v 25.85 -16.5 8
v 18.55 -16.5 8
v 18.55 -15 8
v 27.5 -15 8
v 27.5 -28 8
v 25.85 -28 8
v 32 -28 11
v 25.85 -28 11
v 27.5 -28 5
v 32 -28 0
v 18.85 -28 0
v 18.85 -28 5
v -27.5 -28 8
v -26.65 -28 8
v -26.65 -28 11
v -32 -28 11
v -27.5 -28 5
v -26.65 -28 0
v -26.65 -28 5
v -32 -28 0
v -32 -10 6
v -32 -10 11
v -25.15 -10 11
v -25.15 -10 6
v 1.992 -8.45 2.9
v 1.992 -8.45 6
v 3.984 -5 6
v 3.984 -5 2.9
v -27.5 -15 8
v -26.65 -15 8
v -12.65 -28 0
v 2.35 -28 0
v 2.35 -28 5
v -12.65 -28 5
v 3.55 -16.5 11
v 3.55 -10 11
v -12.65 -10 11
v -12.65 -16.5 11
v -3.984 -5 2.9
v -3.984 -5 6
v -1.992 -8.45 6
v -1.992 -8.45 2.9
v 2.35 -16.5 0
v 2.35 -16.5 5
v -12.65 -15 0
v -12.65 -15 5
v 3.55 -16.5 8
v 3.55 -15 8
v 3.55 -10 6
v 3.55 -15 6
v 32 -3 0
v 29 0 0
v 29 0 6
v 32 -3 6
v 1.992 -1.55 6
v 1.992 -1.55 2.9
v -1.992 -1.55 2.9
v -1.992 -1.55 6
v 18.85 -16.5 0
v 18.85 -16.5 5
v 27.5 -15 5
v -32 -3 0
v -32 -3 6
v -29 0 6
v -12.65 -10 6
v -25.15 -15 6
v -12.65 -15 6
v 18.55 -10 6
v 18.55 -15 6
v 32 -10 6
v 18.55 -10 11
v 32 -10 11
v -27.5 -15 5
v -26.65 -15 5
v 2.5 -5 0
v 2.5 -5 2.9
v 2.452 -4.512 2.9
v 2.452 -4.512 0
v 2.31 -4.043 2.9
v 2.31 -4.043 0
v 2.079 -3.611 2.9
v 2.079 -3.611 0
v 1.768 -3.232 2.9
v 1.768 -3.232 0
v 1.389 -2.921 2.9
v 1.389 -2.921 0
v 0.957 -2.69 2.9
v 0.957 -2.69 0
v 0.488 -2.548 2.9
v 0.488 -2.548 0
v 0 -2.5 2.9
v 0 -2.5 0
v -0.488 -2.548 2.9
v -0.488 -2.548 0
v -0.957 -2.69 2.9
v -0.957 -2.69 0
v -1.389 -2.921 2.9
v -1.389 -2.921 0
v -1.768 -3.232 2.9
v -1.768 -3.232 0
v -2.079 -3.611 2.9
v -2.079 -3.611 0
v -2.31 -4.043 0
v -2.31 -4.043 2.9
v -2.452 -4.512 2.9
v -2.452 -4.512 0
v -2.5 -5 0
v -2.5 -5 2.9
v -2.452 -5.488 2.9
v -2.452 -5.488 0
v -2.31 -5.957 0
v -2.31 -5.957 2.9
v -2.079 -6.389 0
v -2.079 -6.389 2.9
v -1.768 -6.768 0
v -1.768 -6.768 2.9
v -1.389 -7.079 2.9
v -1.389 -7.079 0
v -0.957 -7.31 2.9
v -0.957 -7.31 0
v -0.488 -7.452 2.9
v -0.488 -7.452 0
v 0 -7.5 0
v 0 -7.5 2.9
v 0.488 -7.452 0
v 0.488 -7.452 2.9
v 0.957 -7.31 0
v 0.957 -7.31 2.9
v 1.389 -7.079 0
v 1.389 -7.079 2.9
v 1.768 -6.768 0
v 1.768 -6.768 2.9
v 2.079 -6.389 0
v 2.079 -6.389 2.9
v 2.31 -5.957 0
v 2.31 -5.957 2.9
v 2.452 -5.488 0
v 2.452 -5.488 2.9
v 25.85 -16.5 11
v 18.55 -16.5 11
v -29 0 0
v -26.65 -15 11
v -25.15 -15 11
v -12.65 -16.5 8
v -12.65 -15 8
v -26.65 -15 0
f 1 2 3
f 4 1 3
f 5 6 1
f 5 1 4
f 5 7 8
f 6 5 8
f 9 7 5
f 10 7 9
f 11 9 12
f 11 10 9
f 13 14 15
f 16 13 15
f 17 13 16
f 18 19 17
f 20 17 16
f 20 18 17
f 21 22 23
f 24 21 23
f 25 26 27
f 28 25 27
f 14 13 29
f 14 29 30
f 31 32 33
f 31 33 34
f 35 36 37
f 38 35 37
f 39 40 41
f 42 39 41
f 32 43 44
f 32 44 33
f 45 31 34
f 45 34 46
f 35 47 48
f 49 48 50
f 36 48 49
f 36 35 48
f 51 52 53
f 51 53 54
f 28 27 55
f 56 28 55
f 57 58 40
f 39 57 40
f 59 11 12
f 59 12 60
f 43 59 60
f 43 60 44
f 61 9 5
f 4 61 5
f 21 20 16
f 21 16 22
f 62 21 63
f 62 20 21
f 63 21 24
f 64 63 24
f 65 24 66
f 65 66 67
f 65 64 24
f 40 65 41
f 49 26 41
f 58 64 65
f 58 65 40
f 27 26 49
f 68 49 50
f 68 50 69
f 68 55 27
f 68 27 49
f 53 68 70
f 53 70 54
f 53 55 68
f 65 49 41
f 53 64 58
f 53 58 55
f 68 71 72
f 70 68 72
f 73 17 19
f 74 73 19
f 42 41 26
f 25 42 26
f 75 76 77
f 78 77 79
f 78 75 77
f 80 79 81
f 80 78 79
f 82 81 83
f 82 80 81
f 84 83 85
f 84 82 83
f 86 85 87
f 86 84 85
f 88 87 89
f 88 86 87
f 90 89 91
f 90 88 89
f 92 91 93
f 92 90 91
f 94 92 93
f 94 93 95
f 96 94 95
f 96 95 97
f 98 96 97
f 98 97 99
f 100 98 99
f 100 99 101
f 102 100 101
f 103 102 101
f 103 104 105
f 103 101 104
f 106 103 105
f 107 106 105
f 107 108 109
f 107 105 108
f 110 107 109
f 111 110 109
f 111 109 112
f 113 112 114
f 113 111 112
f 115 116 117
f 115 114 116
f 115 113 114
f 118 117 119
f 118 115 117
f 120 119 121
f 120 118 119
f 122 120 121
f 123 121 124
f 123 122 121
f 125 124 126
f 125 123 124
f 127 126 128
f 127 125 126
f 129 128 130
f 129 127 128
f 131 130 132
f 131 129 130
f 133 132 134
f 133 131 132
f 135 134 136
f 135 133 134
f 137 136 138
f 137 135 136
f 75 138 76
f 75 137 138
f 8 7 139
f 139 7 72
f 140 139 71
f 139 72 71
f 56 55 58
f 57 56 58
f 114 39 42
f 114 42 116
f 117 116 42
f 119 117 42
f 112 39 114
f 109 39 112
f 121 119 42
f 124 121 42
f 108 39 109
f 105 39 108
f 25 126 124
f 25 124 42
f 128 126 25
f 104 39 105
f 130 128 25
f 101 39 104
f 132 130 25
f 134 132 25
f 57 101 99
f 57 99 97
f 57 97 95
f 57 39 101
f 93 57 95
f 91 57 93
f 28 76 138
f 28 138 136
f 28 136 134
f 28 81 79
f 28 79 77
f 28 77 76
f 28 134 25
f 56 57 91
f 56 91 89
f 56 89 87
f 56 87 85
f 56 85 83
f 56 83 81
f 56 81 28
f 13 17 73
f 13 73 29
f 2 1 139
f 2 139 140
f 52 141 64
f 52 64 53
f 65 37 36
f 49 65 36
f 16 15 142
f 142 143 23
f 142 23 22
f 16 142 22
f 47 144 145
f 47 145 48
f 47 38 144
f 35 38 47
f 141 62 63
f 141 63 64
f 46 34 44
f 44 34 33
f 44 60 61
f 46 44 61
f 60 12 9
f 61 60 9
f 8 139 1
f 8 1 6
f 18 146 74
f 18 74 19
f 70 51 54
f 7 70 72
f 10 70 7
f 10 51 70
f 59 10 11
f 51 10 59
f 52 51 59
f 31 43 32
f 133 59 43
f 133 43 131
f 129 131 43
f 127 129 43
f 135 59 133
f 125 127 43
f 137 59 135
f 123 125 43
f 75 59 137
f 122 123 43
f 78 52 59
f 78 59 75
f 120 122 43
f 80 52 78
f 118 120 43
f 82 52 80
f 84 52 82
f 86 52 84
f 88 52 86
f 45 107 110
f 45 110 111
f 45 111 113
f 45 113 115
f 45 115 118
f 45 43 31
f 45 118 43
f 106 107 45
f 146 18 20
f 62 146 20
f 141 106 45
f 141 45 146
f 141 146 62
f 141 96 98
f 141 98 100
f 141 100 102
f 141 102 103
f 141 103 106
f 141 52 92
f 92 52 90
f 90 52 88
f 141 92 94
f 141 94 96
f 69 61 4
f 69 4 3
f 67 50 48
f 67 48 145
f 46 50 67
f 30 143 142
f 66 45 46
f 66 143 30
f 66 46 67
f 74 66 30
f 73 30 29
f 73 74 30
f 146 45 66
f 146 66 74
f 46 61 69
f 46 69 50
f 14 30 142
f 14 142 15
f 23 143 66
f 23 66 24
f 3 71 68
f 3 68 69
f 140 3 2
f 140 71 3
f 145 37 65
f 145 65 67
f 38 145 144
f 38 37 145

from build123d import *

# Parameters (mm, degrees)
SKETCH_R        = 2.5
PAD_DEPTH       = 11
SKETCH001_W     = 93.08528
SKETCH001_H     = 10
POCKET_DEPTH    = 5
SKETCH002_W     = 55
SKETCH002_H     = 3
POCKET001_DEPTH = 13
POCKET002_DEPTH = 3.1
POCKET003_DEPTH = 5


with BuildPart() as part:
    # Sketch → Pad (new body)
    with BuildSketch(Plane.XY):
        Polygon((-29, 0), (29, 0), (32, -3), (32, -28), (18.85, -28), (18.85, -16.5), (2.35, -16.5), (2.35, -28), (-12.65, -28), (-12.65, -15), (-26.65, -15), (-26.65, -28), (-32, -28), (-32, -3), align=None)
        with Locations((0, -5)):
            Circle(SKETCH_R, mode=Mode.SUBTRACT)
    extrude(amount=PAD_DEPTH)

    # Sketch001 (on Face17 of Pad) → Pocket (cut)
    with BuildSketch(Plane.XY.offset(11)):
        with Locations((0, -5)):
            Rectangle(SKETCH001_W, SKETCH001_H)
    extrude(amount=-POCKET_DEPTH, mode=Mode.SUBTRACT)

    # Sketch002 (on Face11 of Pocket) → Pocket001 (cut)
    with BuildSketch(Plane.XZ.offset(28)):
        with Locations((0, 6.5)):
            Rectangle(SKETCH002_W, SKETCH002_H)
    extrude(amount=-POCKET001_DEPTH, mode=Mode.SUBTRACT)

    # Sketch003 (on Face4 of Pocket001) → Pocket002 (cut)
    with BuildSketch(Plane.XY.offset(6)):
        Polygon((3.983717, -5), (1.991858, -1.55), (-1.991858, -1.55), (-3.983717, -5), (-1.991858, -8.45), (1.991858, -8.45), align=None)
    extrude(amount=-POCKET002_DEPTH, mode=Mode.SUBTRACT)

    # Sketch004 (on Face25 of Pocket002) → Pocket003 (cut)
    with BuildSketch(Plane.XY.offset(11)):
        Polygon((-25.15, -5.838694), (-12.65, -5.838694), (-12.65, -16.5), (3.55, -16.5), (3.55, -5.838694), (18.55, -5.838694), (18.55, -16.5), (25.85, -16.5), (25.85, -33.515926), (-25.15, -33.515926), align=None)
    extrude(amount=-POCKET003_DEPTH, mode=Mode.SUBTRACT)


solid = part.part
